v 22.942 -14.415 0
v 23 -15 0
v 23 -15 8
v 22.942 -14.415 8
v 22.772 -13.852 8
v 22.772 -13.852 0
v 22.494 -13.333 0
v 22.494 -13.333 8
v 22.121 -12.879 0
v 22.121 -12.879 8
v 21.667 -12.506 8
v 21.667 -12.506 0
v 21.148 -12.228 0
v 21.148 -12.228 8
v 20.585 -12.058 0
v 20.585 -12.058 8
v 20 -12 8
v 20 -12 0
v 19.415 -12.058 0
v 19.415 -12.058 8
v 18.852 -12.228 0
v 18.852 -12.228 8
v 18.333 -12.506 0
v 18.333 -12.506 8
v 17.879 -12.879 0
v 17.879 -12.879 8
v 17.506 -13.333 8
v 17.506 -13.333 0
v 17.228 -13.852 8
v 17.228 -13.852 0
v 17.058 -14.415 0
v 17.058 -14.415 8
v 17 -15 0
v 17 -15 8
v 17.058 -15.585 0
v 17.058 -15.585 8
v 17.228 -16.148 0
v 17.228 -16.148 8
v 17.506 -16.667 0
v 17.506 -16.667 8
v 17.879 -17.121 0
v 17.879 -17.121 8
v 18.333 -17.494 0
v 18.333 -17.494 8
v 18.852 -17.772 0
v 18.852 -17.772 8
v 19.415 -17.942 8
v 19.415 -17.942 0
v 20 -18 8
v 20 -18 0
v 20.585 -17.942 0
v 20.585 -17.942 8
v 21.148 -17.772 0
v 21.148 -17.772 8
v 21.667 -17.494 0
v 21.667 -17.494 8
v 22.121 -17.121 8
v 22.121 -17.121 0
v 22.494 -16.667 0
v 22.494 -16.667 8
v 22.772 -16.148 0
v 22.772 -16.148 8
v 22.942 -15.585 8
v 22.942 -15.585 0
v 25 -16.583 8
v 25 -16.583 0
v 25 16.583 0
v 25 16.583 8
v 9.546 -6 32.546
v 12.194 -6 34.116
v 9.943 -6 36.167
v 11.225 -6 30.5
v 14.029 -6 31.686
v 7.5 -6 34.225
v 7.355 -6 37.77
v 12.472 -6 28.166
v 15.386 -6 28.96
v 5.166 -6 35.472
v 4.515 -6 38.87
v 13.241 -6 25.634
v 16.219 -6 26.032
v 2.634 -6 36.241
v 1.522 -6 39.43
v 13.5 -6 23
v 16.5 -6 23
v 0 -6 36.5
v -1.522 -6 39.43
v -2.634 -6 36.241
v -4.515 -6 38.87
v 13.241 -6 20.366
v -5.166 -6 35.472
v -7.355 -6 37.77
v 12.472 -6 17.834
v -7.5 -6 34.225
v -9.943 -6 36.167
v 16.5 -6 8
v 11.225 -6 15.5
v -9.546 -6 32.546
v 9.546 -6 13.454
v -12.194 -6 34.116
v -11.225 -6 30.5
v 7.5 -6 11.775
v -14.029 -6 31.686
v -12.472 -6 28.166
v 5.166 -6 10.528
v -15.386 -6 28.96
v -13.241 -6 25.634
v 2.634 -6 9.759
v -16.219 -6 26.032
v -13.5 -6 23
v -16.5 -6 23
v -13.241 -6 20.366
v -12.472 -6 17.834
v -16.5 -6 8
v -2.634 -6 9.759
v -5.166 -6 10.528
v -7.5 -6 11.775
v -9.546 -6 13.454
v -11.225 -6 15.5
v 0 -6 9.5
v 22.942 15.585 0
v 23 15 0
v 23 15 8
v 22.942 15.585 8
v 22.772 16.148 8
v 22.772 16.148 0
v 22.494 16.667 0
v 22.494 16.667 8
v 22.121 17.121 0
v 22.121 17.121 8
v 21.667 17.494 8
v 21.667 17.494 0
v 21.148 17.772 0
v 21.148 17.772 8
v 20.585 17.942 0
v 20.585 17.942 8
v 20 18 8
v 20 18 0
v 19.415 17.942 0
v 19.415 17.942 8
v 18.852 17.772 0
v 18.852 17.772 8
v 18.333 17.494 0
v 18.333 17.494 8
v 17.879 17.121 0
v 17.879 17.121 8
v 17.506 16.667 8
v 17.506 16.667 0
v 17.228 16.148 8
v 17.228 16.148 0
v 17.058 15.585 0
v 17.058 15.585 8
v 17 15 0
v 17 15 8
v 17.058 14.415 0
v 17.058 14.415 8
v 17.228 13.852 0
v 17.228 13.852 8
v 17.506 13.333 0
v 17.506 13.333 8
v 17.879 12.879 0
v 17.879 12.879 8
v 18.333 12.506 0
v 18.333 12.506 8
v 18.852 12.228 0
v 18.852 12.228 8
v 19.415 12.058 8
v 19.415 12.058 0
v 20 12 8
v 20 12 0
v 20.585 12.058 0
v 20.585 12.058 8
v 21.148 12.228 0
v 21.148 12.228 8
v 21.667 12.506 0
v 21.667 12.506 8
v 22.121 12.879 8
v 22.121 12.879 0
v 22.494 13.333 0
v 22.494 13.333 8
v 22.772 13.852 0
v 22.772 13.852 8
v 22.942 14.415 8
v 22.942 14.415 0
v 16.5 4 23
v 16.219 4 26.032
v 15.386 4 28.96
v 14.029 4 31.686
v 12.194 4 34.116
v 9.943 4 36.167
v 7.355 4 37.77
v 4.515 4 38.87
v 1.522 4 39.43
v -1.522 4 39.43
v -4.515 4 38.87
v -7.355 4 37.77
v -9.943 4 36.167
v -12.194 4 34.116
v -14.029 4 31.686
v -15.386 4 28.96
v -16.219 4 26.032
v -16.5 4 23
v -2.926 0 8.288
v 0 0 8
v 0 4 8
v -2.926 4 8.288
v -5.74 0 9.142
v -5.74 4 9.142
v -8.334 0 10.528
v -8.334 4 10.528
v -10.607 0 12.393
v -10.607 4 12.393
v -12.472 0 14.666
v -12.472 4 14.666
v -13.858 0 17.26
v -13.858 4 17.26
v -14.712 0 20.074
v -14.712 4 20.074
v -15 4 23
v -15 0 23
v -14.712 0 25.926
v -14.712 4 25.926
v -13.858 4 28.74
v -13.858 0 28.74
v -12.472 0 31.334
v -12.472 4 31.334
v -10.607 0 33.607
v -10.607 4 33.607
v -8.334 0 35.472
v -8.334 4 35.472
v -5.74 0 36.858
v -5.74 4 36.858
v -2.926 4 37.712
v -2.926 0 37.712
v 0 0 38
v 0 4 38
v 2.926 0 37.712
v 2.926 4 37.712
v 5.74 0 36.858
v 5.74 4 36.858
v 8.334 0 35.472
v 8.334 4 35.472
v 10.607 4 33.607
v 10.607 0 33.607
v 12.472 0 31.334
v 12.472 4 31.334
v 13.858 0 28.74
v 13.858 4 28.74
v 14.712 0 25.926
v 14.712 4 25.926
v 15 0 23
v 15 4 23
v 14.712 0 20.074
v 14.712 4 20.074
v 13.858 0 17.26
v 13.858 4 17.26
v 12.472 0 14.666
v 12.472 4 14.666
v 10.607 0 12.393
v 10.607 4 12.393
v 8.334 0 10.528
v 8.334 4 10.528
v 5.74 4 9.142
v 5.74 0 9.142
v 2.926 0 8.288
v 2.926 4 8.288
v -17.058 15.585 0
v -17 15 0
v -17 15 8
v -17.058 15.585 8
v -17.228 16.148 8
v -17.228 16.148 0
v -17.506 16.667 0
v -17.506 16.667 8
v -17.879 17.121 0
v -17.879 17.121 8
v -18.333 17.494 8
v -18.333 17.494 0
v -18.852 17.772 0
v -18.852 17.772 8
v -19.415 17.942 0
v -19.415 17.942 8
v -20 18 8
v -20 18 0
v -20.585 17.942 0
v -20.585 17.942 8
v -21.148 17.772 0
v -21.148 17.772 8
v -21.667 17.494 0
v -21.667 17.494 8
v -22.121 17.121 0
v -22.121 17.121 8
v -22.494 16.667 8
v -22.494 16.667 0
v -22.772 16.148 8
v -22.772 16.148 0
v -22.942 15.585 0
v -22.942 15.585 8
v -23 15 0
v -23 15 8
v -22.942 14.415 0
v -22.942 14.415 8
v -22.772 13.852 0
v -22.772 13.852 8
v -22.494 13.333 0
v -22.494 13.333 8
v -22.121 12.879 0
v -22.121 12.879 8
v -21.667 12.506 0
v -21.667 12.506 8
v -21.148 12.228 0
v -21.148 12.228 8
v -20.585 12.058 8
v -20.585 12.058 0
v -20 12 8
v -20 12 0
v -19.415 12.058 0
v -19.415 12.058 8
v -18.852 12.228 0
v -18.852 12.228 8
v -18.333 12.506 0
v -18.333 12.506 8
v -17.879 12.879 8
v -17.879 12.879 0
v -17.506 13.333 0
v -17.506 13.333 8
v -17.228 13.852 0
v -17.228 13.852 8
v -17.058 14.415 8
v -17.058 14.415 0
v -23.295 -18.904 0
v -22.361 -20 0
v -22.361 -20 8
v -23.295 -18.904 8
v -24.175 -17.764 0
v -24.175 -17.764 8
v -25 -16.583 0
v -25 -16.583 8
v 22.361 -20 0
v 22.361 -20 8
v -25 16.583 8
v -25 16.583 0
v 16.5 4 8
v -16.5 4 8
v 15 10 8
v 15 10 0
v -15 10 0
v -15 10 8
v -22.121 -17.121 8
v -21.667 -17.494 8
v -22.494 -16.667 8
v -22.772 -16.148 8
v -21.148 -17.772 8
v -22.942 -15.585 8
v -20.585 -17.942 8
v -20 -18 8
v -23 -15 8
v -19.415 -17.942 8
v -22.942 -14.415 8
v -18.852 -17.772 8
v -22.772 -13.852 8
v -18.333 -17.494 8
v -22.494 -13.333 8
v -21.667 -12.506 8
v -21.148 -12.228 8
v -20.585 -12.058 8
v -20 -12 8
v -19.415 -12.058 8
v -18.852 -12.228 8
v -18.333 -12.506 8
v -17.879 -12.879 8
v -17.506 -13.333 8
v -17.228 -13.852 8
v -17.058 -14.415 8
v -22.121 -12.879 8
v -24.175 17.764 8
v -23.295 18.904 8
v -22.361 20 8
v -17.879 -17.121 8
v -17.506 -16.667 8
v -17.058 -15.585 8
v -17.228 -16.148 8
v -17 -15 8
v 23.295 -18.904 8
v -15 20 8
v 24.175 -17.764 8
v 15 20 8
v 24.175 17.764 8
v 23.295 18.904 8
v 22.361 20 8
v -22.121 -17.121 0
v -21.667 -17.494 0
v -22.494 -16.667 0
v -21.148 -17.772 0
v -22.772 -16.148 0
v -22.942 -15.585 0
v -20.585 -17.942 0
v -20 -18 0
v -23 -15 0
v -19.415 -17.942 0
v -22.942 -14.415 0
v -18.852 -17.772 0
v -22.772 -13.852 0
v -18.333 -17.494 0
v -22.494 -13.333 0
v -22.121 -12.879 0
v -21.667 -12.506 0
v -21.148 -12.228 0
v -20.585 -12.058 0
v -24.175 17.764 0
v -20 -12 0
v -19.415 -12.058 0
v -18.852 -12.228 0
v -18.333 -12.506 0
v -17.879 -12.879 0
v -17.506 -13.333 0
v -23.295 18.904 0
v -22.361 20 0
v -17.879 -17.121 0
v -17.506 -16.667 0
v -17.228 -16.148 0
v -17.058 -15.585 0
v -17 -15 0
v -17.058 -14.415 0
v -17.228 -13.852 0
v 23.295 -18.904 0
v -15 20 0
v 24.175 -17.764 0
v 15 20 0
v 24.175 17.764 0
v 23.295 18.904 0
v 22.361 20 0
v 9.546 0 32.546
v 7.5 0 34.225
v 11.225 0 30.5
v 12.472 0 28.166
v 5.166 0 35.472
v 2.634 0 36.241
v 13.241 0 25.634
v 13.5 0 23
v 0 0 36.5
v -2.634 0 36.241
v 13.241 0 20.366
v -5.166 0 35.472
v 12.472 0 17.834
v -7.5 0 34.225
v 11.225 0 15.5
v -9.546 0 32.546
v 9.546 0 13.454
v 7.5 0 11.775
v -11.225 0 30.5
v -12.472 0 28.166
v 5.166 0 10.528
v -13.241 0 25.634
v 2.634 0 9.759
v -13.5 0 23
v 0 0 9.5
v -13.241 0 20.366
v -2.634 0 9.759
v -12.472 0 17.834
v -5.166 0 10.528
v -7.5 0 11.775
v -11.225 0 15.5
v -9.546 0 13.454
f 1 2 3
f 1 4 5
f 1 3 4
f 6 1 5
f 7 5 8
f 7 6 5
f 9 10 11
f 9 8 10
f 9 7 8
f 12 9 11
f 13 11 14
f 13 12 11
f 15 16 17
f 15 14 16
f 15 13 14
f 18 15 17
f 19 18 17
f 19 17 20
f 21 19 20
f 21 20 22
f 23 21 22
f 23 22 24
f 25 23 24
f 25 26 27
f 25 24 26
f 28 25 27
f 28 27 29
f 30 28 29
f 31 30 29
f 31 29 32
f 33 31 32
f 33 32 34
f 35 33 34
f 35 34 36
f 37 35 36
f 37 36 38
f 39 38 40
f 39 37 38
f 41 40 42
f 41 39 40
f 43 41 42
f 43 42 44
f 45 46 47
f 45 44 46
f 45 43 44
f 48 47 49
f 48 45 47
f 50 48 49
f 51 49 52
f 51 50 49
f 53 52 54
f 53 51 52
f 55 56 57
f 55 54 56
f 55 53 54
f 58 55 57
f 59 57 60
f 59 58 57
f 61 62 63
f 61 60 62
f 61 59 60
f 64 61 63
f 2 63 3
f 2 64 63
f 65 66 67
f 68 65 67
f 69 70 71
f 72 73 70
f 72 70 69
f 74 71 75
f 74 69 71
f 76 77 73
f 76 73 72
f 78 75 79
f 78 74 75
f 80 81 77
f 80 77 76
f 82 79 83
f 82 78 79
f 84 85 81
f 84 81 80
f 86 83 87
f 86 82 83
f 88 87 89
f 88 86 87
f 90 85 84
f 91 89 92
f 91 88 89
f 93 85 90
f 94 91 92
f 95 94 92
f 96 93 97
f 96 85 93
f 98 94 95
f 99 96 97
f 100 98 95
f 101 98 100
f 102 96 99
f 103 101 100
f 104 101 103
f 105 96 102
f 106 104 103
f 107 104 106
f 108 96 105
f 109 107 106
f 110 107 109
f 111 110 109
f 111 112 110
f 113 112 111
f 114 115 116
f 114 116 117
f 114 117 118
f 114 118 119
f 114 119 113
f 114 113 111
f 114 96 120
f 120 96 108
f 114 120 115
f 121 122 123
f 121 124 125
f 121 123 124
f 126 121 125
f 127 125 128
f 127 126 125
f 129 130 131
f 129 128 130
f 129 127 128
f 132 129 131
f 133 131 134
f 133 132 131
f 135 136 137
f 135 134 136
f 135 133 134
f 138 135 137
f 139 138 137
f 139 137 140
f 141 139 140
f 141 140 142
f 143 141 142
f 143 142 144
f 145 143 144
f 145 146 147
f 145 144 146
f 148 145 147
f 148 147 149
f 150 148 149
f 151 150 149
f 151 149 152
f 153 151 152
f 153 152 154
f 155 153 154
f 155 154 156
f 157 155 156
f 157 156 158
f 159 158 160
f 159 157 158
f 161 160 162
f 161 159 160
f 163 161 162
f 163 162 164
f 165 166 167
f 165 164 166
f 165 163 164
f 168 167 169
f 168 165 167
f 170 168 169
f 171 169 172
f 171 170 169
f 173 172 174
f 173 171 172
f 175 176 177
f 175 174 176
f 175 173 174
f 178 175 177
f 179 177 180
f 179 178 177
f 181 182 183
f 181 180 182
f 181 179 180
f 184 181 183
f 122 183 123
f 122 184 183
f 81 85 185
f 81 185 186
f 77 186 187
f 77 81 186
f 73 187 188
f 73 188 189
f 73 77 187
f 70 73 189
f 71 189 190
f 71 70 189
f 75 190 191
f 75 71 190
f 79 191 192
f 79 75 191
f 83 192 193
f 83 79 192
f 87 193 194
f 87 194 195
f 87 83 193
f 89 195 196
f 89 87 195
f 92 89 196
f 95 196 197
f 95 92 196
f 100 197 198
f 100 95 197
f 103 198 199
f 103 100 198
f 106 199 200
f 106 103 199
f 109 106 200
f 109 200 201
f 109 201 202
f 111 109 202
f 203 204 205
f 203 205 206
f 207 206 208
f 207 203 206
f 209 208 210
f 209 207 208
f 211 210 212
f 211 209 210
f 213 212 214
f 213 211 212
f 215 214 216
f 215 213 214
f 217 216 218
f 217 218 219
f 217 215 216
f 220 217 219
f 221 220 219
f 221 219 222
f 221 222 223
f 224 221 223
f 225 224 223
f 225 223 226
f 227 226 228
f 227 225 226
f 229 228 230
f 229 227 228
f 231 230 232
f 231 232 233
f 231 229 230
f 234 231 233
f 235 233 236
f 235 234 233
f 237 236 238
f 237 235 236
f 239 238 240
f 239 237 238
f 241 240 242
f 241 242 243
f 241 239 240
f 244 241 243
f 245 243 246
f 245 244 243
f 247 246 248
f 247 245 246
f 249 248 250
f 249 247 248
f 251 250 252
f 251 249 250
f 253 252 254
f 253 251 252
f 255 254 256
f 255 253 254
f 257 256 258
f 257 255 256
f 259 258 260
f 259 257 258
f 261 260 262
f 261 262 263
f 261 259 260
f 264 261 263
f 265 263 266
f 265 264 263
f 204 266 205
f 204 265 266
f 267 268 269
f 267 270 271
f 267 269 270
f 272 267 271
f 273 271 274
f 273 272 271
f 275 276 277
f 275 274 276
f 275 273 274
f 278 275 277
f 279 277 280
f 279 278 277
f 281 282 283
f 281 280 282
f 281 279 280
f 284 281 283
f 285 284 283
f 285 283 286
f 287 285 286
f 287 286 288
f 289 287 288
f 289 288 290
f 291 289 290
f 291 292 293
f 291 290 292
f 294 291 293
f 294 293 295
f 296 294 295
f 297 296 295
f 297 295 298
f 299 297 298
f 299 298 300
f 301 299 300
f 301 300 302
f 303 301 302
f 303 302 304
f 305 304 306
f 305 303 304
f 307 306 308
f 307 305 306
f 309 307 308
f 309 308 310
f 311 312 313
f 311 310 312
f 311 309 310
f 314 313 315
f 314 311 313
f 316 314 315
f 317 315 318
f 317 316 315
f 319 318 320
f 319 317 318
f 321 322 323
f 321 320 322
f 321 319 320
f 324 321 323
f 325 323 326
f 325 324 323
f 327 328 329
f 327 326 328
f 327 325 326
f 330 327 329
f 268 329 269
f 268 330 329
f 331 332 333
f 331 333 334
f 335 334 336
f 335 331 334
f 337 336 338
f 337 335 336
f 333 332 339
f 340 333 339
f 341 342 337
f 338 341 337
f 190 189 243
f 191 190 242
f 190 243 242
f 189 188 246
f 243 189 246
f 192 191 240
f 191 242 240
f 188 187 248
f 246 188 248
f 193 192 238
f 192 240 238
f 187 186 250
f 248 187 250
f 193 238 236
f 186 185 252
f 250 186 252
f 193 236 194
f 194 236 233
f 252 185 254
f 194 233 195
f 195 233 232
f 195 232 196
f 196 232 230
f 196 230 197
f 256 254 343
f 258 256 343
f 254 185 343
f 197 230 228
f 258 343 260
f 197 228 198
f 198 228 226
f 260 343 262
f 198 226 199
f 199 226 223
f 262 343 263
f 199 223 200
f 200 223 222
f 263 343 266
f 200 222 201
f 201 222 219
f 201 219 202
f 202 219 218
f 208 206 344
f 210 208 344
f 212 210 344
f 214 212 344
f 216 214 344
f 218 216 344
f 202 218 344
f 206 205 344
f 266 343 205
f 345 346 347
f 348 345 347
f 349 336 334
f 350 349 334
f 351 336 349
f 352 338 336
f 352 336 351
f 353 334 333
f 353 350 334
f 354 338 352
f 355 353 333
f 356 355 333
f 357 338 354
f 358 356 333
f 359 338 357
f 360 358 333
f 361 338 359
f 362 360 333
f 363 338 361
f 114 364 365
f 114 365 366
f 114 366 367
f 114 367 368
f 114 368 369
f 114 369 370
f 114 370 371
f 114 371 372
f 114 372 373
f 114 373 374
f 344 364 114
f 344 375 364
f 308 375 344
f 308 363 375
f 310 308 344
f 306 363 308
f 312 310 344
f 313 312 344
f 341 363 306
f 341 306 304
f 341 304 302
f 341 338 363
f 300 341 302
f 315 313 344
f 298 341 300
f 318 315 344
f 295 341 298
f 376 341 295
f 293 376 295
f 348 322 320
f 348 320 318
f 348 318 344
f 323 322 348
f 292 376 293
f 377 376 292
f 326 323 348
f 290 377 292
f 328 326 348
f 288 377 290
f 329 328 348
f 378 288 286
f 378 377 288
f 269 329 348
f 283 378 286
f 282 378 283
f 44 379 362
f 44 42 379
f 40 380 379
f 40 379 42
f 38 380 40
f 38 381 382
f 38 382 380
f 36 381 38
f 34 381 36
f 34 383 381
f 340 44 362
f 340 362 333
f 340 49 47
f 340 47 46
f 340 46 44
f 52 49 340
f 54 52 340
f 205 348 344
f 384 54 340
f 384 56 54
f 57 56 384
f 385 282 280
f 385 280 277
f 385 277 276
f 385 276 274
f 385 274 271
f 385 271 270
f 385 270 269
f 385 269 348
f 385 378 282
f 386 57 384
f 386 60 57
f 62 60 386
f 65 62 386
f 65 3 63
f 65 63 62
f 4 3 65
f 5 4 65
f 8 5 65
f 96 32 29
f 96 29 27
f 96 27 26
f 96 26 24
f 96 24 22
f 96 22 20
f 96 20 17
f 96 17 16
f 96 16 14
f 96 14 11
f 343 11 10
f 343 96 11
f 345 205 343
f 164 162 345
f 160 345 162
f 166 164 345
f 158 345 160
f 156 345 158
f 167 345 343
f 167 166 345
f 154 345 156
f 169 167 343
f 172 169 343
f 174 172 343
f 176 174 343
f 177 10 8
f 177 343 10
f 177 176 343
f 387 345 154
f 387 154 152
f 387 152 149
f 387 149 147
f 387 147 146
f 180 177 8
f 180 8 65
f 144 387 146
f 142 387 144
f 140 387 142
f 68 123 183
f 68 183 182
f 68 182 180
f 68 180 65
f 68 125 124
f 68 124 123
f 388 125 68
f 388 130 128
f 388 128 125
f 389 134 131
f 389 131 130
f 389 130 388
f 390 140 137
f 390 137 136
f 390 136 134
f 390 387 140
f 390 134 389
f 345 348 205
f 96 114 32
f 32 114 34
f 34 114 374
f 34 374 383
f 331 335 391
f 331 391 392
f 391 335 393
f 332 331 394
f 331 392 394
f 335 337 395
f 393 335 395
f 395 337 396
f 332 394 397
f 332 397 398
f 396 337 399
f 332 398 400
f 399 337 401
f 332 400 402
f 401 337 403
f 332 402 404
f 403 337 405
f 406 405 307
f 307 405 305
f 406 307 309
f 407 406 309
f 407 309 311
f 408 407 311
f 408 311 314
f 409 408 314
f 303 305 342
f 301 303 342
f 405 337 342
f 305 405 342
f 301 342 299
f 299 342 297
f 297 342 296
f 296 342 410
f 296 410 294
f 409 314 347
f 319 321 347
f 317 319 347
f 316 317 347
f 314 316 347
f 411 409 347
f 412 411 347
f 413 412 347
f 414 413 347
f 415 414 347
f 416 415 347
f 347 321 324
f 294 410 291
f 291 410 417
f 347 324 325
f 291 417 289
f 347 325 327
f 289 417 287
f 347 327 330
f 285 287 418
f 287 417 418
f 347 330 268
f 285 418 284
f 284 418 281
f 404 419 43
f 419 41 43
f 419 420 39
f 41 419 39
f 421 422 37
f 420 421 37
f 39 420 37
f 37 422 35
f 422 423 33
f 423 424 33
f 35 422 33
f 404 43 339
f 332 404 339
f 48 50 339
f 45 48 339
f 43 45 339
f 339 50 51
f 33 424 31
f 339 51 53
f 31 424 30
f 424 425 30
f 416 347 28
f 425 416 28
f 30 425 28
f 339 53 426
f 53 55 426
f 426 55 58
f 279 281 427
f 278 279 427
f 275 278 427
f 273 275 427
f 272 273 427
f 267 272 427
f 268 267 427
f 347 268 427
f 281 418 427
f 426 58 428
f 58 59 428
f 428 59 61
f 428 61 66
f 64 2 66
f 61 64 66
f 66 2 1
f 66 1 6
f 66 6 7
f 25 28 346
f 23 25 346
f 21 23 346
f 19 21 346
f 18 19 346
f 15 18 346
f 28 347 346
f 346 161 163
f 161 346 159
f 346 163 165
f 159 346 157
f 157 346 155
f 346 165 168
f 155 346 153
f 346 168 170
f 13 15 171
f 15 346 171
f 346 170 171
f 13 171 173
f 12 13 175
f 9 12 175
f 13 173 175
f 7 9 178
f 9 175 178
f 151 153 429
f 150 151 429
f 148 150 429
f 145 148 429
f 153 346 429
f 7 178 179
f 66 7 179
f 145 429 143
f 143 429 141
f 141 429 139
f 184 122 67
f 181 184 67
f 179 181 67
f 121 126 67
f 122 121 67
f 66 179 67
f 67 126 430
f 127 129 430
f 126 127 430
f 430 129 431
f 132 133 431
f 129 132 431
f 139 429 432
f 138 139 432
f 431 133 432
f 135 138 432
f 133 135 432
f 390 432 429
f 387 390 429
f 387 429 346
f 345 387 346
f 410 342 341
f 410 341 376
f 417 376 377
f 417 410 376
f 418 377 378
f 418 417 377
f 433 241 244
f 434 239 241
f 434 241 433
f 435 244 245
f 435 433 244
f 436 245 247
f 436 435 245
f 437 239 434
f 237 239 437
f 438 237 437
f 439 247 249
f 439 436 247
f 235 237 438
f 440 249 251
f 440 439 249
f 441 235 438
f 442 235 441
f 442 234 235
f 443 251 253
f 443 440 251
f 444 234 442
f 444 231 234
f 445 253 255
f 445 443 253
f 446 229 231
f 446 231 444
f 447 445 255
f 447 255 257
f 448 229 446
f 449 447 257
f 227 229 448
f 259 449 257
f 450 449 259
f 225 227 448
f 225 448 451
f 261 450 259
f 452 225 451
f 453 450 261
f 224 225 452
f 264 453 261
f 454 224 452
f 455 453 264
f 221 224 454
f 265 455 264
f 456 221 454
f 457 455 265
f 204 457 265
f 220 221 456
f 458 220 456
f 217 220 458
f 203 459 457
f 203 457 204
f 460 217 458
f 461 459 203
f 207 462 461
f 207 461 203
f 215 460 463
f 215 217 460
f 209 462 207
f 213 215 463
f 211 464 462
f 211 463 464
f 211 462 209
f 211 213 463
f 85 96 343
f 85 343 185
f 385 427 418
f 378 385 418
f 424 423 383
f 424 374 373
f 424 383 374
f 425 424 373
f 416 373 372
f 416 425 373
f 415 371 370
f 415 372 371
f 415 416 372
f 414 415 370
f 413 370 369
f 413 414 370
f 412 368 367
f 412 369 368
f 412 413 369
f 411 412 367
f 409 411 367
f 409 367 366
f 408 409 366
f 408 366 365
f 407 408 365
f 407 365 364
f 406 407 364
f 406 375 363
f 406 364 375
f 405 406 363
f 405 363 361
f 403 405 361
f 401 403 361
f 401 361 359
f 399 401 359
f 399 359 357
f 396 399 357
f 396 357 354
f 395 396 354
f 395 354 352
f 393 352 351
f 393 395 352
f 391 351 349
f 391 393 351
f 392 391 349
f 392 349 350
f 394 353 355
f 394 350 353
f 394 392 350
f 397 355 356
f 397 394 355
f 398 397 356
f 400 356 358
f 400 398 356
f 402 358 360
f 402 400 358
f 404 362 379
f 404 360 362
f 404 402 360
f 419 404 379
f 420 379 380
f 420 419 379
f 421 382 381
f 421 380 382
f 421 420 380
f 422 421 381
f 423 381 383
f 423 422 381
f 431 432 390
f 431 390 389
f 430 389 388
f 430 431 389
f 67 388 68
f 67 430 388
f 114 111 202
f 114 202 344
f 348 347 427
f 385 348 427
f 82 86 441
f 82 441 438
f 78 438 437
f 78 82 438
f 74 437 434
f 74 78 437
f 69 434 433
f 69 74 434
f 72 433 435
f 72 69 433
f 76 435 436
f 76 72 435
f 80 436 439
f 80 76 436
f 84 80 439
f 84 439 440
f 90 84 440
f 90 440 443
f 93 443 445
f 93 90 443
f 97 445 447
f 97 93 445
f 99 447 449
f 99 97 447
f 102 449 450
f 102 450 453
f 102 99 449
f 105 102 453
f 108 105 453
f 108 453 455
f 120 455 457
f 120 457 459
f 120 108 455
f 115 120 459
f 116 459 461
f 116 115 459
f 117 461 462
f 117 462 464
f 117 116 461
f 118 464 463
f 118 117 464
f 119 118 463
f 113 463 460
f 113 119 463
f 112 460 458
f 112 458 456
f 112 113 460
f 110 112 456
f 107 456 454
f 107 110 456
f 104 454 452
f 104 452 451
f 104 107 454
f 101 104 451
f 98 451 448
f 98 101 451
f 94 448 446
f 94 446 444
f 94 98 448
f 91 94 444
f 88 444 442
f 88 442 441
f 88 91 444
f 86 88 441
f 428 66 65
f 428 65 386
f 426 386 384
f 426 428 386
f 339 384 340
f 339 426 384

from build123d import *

# Parameters (mm, degrees)
BOSS_EXTRUDE1_DEPTH     = 8
CUT_EXTRUDE4_DEPTH      = 34
CUT_EXTRUDE4_DEPTH_BACK = 34
SKETCH2_R               = 3
SKETCH3_R               = 15
BOSS_EXTRUDE2_DEPTH     = 4
BOSS_EXTRUDE4_START     = -6
SKETCH3_5_R             = 15
SKETCH3_5_R_2           = 13.5
BOSS_EXTRUDE4_DEPTH     = 6
CUT_EXTRUDE5_DEPTH      = 8


# Read off the part's stored shape, not the designer's step: Cut-Extrude5
with BuildPart() as part:
    # Sketch1 → Boss-Extrude1 (new body)
    with BuildSketch(Plane.XY):
        Polygon((-25, -20), (25, -20), (25, 20), (15, 20), (15, 10), (-15, 10), (-15, 20), (-25, 20), align=None)
    extrude(amount=BOSS_EXTRUDE1_DEPTH)

    # Sketch2 → Cut-Extrude4 (cut, two sides: drawn at the far end of the back side and taken through both)
    with BuildSketch(Plane.XY.offset(-CUT_EXTRUDE4_DEPTH_BACK)):
        with Locations((-20, 15)):
            Circle(SKETCH2_R)
        with Locations((-20, -15)):
            Circle(SKETCH2_R)
        with Locations((20, -15)):
            Circle(SKETCH2_R)
        with Locations((20, 15)):
            Circle(SKETCH2_R)
    extrude(amount=CUT_EXTRUDE4_DEPTH + CUT_EXTRUDE4_DEPTH_BACK, mode=Mode.SUBTRACT)

    # Sketch3 → Boss-Extrude2 (add)
    with BuildSketch(Plane(origin=(0, 0, 0), x_dir=(1, 0, 0), z_dir=(0, 1, 0))):
        with BuildLine():
            Line((-16.5, -23), (-16.5, -7))
            Line((-16.5, -7), (16.5, -7))
            Line((16.5, -7), (16.5, -23))
            ThreePointArc((16.5, -23), (0, -39.5), (-16.5, -23))
        make_face()
        with Locations(Location((0, -23, 0), (0, 0, 90))):
            Circle(SKETCH3_R, mode=Mode.SUBTRACT)
    extrude(amount=BOSS_EXTRUDE2_DEPTH)

    # Sketch3<5> → Boss-Extrude4 (add)
    # profile 1 of 2: a face of its own
    with BuildSketch(Plane(origin=(0, 0, 0), x_dir=(1, 0, 0), z_dir=(0, 1, 0)).offset(BOSS_EXTRUDE4_START)):
        with BuildLine():
            Line((-16.5, -23), (-16.5, -7))
            Line((-16.5, -7), (16.5, -7))
            Line((16.5, -7), (16.5, -23))
            ThreePointArc((16.5, -23), (0, -39.5), (-16.5, -23))
        make_face()
        with Locations(Location((0, -23, 0), (0, 0, 90))):
            Circle(SKETCH3_5_R, mode=Mode.SUBTRACT)
    # profile 2 of 2: a face of its own
    with BuildSketch(Plane(origin=(0, 0, 0), x_dir=(1, 0, 0), z_dir=(0, 1, 0)).offset(BOSS_EXTRUDE4_START)):
        with Locations(Location((0, -23, 0), (0, 0, 90))):
            Circle(SKETCH3_5_R)
        with Locations(Location((0, -23, 0), (0, 0, 270))):
            Circle(SKETCH3_5_R_2, mode=Mode.SUBTRACT)
    extrude(amount=BOSS_EXTRUDE4_DEPTH)

    # Cut-Extrude5 outline → Cut-Extrude5 (cut)
    with BuildSketch(Plane.XY):
        with BuildLine():
            Line((25, 20), (22.360679775, 20))
            ThreePointArc((22.360679775, 20), (23.74188825, 18.339104186), (25, 16.583123952))
            Line((25, 16.583123952), (25, 20))
        make_face()
        with BuildLine():
            Line((-25, 20), (-25, 16.583123952))
            ThreePointArc((-25, 16.583123952), (-23.74188825, 18.339104186), (-22.360679775, 20))
            Line((-22.360679775, 20), (-25, 20))
        make_face()
        with BuildLine():
            Line((-25, -20), (-22.360679775, -20))
            ThreePointArc((-22.360679775, -20), (-23.74188825, -18.339104186), (-25, -16.583123952))
            Line((-25, -16.583123952), (-25, -20))
        make_face()
        with BuildLine():
            Line((25, -20), (25, -16.583123952))
            ThreePointArc((25, -16.583123952), (23.74188825, -18.339104186), (22.360679775, -20))
            Line((22.360679775, -20), (25, -20))
        make_face()
    extrude(amount=CUT_EXTRUDE5_DEPTH, mode=Mode.SUBTRACT)


solid = part.part
